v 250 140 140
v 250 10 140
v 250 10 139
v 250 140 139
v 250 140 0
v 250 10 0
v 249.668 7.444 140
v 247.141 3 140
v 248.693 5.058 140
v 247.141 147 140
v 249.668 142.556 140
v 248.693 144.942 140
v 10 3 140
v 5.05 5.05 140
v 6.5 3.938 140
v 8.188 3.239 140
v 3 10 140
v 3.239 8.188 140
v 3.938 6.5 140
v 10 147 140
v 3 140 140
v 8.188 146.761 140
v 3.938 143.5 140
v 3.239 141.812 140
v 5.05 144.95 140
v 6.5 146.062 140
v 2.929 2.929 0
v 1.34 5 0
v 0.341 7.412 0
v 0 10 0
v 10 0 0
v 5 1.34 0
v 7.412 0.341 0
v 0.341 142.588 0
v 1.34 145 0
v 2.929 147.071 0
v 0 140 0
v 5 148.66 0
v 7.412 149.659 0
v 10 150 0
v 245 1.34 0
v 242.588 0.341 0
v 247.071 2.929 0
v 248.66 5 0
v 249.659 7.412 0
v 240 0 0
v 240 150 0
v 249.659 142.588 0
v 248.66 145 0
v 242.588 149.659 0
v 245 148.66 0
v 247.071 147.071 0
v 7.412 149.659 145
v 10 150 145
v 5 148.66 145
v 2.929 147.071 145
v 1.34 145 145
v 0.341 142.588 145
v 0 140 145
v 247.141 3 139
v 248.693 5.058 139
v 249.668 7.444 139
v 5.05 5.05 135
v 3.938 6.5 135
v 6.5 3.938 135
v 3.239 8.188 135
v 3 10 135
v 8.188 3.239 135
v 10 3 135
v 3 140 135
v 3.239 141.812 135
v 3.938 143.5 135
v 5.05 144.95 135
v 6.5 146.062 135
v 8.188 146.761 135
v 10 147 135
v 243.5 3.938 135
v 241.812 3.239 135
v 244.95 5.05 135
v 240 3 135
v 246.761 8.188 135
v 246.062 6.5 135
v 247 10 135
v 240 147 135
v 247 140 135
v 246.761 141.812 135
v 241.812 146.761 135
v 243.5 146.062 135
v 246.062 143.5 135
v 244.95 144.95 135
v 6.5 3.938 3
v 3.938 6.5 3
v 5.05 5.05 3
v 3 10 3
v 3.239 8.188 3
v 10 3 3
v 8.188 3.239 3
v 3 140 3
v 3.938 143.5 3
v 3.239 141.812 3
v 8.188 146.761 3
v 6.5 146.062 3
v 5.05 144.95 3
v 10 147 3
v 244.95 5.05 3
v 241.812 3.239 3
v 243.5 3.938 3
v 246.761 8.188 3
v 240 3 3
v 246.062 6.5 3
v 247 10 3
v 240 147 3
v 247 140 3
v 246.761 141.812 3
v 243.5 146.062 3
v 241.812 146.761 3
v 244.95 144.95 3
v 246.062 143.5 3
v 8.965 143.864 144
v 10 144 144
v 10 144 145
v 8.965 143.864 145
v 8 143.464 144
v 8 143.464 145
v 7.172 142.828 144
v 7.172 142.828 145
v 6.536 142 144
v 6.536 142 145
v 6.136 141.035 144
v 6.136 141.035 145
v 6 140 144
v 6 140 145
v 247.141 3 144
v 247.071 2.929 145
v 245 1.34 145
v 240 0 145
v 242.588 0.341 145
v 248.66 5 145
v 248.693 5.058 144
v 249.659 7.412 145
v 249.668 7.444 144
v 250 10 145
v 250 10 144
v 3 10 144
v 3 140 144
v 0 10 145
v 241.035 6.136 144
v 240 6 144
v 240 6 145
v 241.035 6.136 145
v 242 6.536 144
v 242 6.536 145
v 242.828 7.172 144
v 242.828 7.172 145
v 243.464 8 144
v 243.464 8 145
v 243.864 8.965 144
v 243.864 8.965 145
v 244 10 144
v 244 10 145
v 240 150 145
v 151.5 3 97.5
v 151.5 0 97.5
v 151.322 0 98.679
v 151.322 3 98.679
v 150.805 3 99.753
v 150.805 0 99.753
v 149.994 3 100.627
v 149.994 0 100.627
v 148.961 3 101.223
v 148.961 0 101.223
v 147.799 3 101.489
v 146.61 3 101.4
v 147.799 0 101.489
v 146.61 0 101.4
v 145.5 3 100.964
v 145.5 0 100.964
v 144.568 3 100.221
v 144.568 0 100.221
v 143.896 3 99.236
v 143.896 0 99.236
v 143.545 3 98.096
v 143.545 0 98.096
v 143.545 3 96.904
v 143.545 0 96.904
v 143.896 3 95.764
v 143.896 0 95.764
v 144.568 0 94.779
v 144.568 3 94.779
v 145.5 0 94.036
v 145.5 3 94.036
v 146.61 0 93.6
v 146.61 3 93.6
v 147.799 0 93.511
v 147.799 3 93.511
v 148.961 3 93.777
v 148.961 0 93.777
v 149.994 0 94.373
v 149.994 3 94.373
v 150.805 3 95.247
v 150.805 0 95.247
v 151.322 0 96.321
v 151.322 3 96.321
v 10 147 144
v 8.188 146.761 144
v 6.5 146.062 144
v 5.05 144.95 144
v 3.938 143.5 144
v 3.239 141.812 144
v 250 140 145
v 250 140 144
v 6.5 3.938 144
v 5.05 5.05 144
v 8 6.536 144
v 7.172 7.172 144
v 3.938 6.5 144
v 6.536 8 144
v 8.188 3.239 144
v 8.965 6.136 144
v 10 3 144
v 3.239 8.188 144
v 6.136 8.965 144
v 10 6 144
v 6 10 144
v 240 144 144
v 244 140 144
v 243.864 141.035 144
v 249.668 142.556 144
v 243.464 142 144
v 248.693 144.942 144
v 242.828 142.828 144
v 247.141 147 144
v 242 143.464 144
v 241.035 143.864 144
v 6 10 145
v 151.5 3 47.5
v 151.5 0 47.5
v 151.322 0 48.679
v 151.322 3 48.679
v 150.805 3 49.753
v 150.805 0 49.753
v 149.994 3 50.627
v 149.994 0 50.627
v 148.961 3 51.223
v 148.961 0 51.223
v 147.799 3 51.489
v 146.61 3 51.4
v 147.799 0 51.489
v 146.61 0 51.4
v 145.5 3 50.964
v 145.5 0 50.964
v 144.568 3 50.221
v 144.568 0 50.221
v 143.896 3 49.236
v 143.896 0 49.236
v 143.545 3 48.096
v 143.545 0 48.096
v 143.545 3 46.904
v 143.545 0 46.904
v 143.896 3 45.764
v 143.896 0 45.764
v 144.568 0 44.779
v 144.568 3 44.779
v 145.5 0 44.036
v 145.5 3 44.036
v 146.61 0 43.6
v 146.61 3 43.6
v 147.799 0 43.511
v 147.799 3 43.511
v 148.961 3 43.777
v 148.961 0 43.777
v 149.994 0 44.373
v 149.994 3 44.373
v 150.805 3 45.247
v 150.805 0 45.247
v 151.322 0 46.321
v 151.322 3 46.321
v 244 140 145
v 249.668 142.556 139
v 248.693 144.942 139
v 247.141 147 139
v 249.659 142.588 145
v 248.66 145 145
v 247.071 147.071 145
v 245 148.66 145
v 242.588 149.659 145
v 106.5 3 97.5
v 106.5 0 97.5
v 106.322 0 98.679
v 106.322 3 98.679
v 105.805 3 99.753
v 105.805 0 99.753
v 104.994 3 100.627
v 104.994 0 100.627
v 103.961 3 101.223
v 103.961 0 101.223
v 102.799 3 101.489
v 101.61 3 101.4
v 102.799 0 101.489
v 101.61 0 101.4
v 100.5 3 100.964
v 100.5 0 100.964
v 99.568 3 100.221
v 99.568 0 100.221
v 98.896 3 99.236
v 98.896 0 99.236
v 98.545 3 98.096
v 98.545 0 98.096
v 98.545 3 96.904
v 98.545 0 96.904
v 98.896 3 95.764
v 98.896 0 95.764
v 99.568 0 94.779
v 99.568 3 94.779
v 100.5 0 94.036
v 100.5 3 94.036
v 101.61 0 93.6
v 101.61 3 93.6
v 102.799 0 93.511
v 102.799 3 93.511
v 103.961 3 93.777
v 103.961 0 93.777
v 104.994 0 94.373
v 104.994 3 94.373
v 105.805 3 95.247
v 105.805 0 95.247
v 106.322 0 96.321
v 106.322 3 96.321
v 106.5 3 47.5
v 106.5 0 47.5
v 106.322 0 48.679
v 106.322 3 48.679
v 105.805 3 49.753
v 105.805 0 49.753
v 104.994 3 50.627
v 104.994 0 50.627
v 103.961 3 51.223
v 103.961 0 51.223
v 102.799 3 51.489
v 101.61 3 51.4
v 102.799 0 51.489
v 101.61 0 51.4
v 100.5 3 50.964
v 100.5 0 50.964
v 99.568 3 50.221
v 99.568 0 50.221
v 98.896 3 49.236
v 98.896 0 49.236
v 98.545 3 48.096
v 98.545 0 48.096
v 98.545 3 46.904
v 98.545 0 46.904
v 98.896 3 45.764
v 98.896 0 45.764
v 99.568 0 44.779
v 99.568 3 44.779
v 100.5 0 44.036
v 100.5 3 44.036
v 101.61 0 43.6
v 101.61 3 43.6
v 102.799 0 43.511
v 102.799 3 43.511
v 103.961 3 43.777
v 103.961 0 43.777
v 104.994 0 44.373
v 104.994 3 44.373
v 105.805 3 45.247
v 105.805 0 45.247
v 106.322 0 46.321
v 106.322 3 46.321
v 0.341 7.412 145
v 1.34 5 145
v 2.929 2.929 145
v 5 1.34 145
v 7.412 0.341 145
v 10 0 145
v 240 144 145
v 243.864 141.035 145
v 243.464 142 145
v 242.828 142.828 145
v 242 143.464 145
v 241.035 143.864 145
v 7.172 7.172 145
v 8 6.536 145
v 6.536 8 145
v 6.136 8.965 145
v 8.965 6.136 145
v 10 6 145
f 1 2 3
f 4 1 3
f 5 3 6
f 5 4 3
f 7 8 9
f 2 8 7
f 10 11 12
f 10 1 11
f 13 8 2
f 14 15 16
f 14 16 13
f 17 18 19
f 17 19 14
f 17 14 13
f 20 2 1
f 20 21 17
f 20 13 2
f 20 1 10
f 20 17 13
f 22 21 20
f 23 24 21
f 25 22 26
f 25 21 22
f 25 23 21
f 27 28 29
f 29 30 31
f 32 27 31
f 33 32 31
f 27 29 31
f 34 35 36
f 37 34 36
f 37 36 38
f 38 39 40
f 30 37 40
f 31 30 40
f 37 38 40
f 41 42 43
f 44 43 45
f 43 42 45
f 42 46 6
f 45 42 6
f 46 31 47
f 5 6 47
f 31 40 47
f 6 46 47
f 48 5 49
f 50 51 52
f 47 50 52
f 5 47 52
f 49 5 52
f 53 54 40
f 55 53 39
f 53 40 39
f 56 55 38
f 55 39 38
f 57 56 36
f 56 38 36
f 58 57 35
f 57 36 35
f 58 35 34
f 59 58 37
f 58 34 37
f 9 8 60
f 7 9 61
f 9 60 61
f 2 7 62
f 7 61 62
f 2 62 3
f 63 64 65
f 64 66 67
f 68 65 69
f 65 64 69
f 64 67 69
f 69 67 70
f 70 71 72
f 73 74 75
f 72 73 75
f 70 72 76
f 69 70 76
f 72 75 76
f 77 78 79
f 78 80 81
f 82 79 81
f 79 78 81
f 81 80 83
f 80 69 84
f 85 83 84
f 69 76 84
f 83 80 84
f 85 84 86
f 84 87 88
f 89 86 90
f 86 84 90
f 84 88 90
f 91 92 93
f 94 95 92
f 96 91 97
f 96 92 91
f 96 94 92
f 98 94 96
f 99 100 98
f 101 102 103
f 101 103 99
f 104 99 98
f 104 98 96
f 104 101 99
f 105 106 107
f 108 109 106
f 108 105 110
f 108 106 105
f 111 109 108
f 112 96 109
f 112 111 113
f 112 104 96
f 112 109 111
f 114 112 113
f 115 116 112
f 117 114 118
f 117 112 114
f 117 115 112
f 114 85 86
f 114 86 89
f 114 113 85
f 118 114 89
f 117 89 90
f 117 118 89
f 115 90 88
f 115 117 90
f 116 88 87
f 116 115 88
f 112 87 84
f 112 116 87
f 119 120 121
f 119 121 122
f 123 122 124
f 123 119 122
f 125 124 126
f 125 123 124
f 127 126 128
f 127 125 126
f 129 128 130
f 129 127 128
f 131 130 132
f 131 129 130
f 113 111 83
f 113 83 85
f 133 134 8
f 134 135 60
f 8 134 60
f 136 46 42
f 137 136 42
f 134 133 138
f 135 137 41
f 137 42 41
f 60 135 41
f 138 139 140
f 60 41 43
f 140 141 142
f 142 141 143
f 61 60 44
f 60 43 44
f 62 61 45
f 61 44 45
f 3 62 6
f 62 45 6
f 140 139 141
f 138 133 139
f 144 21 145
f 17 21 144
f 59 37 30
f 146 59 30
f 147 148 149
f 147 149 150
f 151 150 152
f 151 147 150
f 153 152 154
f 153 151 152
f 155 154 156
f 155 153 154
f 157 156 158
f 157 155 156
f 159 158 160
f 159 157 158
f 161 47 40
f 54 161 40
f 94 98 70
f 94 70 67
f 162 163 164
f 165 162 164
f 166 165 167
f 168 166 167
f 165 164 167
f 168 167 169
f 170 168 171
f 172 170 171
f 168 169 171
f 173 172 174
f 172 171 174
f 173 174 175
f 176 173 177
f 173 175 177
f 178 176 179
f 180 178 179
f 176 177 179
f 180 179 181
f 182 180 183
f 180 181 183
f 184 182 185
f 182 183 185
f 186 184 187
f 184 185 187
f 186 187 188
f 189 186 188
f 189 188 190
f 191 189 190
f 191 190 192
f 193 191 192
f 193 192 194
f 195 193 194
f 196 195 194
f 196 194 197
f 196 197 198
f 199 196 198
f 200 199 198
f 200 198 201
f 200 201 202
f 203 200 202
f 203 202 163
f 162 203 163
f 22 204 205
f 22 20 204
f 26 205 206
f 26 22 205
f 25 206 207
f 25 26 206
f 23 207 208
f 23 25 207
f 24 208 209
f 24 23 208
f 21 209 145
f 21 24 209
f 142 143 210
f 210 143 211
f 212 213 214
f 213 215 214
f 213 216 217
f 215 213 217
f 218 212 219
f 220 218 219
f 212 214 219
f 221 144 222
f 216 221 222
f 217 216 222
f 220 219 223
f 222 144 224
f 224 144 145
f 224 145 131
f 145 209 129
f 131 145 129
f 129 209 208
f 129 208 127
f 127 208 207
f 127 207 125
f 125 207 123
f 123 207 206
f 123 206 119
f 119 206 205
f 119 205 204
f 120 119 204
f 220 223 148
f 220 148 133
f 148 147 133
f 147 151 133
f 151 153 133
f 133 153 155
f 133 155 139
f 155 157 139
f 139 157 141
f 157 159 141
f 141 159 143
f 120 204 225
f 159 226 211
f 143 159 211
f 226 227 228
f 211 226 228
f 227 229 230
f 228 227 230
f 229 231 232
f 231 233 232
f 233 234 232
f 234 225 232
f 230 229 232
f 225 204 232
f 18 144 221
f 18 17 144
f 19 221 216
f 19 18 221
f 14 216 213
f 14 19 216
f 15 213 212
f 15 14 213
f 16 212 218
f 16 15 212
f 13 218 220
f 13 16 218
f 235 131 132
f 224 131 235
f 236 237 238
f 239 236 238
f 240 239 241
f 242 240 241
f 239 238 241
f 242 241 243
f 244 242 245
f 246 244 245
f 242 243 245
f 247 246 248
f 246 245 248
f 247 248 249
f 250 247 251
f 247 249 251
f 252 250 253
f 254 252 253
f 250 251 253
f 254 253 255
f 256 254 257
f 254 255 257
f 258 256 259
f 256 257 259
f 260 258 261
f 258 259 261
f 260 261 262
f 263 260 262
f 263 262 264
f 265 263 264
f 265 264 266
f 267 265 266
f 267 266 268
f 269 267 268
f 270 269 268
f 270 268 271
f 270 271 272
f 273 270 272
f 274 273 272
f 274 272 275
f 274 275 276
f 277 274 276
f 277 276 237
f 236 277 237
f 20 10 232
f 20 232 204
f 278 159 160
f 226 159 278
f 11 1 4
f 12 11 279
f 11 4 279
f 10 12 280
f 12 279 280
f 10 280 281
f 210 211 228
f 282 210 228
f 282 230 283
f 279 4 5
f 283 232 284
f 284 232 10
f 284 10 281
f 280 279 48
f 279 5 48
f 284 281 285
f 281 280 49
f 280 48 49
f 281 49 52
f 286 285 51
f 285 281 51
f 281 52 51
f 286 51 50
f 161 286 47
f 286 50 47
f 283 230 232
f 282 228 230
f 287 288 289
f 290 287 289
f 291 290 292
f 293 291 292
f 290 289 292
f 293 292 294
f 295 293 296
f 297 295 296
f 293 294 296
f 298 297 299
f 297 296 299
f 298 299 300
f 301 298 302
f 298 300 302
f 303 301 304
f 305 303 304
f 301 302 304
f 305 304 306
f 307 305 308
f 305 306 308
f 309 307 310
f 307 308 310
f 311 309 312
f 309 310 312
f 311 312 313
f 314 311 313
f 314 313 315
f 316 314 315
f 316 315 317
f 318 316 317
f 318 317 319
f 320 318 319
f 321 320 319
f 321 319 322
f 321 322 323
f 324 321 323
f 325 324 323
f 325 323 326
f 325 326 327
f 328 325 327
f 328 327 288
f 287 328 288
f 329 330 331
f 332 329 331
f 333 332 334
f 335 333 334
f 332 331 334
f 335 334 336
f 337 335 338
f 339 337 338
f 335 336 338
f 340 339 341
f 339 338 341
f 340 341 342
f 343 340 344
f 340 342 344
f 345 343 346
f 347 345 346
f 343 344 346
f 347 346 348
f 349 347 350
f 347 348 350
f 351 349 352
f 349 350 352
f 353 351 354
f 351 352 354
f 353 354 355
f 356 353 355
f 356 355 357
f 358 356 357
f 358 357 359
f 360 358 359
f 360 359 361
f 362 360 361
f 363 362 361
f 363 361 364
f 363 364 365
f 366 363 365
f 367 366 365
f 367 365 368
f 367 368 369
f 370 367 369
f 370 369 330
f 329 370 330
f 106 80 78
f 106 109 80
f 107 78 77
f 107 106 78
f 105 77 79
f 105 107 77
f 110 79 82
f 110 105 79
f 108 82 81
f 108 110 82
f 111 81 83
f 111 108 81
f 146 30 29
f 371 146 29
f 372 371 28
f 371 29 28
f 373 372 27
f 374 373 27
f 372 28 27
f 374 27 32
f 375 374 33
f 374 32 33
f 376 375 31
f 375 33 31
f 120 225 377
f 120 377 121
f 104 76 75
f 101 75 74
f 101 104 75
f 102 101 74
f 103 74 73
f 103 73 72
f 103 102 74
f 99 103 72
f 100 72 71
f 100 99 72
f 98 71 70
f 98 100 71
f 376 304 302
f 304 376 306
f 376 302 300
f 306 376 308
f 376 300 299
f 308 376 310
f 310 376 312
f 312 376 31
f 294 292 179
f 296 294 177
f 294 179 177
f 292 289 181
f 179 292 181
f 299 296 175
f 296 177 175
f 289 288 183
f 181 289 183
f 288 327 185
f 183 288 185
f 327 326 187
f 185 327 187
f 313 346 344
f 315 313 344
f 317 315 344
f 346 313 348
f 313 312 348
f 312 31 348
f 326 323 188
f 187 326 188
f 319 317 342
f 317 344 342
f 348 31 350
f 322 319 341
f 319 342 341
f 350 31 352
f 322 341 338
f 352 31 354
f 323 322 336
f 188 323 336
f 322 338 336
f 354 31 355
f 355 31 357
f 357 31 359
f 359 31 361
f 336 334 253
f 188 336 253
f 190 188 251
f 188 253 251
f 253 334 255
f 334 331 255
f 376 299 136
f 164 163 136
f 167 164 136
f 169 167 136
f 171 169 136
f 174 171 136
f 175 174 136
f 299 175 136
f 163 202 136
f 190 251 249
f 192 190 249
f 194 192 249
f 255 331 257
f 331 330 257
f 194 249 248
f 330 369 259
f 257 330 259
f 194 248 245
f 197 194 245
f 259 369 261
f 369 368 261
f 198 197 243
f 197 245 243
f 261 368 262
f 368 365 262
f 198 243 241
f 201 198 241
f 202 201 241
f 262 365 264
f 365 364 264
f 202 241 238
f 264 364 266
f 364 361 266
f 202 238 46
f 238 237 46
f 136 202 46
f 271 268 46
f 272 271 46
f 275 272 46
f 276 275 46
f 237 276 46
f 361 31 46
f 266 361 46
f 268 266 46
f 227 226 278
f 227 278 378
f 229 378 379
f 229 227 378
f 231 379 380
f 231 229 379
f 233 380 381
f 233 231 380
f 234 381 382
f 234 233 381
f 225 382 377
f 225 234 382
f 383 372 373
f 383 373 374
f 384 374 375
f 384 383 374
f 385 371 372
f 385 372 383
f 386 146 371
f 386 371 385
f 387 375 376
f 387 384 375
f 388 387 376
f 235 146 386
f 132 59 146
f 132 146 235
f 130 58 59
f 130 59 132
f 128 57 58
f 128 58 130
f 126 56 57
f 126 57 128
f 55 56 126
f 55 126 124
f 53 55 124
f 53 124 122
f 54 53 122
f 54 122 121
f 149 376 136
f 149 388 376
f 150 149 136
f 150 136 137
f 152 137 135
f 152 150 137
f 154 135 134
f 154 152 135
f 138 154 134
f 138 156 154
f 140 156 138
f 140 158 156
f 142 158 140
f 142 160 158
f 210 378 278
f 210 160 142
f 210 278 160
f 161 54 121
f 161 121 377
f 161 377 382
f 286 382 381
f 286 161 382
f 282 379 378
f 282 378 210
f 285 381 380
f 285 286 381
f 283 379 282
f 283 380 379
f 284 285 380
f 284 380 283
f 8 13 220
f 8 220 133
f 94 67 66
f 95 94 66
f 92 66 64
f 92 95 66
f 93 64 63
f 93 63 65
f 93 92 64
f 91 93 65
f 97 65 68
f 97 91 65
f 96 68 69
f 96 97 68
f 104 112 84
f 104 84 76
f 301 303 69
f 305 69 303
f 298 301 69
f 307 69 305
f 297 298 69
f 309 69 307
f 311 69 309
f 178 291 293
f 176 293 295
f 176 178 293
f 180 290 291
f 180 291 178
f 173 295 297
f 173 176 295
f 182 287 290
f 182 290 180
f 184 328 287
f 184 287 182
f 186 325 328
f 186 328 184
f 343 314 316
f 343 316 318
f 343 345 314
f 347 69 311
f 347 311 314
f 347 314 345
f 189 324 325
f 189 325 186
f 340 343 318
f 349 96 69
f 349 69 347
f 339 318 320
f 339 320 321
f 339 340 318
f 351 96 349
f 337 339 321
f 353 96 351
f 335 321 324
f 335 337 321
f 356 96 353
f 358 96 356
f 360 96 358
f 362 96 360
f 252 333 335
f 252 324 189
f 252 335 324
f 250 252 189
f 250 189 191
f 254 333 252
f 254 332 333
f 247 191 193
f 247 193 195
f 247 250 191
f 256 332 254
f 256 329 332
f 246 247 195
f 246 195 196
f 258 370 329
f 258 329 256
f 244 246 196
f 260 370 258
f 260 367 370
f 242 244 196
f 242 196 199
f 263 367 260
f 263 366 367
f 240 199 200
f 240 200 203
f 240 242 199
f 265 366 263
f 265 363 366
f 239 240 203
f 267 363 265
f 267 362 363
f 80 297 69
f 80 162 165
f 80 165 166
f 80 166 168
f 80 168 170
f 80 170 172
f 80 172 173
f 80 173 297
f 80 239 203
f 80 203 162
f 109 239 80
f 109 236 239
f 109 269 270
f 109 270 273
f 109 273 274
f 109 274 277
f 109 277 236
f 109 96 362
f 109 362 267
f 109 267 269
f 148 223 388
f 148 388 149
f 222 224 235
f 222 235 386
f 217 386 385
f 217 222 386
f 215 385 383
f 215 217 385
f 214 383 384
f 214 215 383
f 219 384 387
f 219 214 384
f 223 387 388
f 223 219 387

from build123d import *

# Parameters (mm, degrees)
BOSS_EXTRUDE1_DEPTH = 150
SHELL2_T            = -3
BOSS_EXTRUDE2_DEPTH = 3
CUT_EXTRUDE1_DEPTH  = 5
BOSS_EXTRUDE3_DEPTH = 5
BOSS_EXTRUDE4_DEPTH = 1
SKETCH10_W          = 5
SKETCH10_H          = 144
CUT_EXTRUDE2_DEPTH  = 8
SKETCH11_W          = 5
SKETCH11_H          = 144
CUT_EXTRUDE3_DEPTH  = 8
SKETCH12_W          = 1
SKETCH12_H          = 144
BOSS_EXTRUDE5_DEPTH = 16
CUT_EXTRUDE4_DEPTH  = 8
CUT_EXTRUDE5_DEPTH  = 8
SKETCH15_R          = 4
CUT_EXTRUDE13_DEPTH = 9


with BuildPart() as part:
    # Sketch2 → Boss-Extrude1 (new body)
    with BuildSketch(Plane.XY):
        with BuildLine():
            Line((10, 0), (240, 0))
            ThreePointArc((240, 0), (247.071067812, 2.928932188), (250, 10))
            Line((250, 10), (250, 140))
            ThreePointArc((250, 140), (247.071067812, 147.071067812), (240, 150))
            Line((240, 150), (10, 150))
            ThreePointArc((10, 150), (2.928932188, 147.071067812), (0, 140))
            Line((0, 140), (0, 10))
            ThreePointArc((0, 10), (2.928932188, 2.928932188), (10, 0))
        make_face()
    extrude(amount=BOSS_EXTRUDE1_DEPTH)

    # Shell2
    shell2_openings = [part.faces().sort_by_distance(p)[0] for p in [
        (125, 75, 0),
    ]]
    offset(amount=SHELL2_T, openings=shell2_openings, kind=Kind.INTERSECTION)

    # Sketch4 → Boss-Extrude2 (add)
    with BuildSketch(Plane(origin=(0, 0, 0), x_dir=(-1, 0, 0), z_dir=(0, 0, -1))):
        with BuildLine():
            Line((-10, 3), (-240, 3))
            ThreePointArc((-240, 3), (-244.949747468, 5.050252532), (-247, 10))
            Line((-247, 10), (-247, 140))
            ThreePointArc((-247, 140), (-244.949747468, 144.949747468), (-240, 147))
            Line((-240, 147), (-10, 147))
            ThreePointArc((-10, 147), (-5.050252532, 144.949747468), (-3, 140))
            Line((-3, 140), (-3, 10))
            ThreePointArc((-3, 10), (-5.050252532, 5.050252532), (-10, 3))
        make_face()
    extrude(amount=-BOSS_EXTRUDE2_DEPTH)

    # Sketch5 → Cut-Extrude1 (cut)
    with BuildSketch(Plane.XY.offset(150)):
        with BuildLine():
            Line((240, 150), (10, 150))
            ThreePointArc((10, 150), (2.928932188, 147.071067812), (0, 140))
            Line((0, 140), (0, 10))
            ThreePointArc((0, 10), (2.928932188, 2.928932188), (10, 0))
            Line((10, 0), (240, 0))
            ThreePointArc((240, 0), (247.071067812, 2.928932188), (250, 10))
            Line((250, 10), (250, 140))
            ThreePointArc((250, 140), (247.071067812, 147.071067812), (240, 150))
        make_face()
    extrude(amount=-CUT_EXTRUDE1_DEPTH, mode=Mode.SUBTRACT)

    # Sketch6 → Boss-Extrude3 (add)
    with BuildSketch(Plane.XY.offset(135)):
        with BuildLine():
            Line((10, 3), (240, 3))
            ThreePointArc((240, 3), (244.949747468, 5.050252532), (247, 10))
            Line((247, 10), (247, 140))
            ThreePointArc((247, 140), (244.949747468, 144.949747468), (240, 147))
            Line((240, 147), (10, 147))
            ThreePointArc((10, 147), (5.050252532, 144.949747468), (3, 140))
            Line((3, 140), (3, 10))
            ThreePointArc((3, 10), (5.050252532, 5.050252532), (10, 3))
        make_face()
    extrude(amount=BOSS_EXTRUDE3_DEPTH)

    # Sketch7 → Boss-Extrude4 (add)
    with BuildSketch(Plane.XY.offset(144)):
        with BuildLine():
            Line((10, 3), (240, 3))
            ThreePointArc((240, 3), (244.949747468, 5.050252532), (247, 10))
            Line((247, 10), (247, 140))
            ThreePointArc((247, 140), (244.949747468, 144.949747468), (240, 147))
            Line((240, 147), (10, 147))
            ThreePointArc((10, 147), (5.050252532, 144.949747468), (3, 140))
            Line((3, 140), (3, 10))
            ThreePointArc((3, 10), (5.050252532, 5.050252532), (10, 3))
        make_face()
        with BuildLine():
            Line((6, 140), (6, 10))
            ThreePointArc((6, 10), (7.171572875, 7.171572875), (10, 6))
            Line((10, 6), (240, 6))
            ThreePointArc((240, 6), (242.828427125, 7.171572875), (244, 10))
            Line((244, 10), (244, 140))
            ThreePointArc((244, 140), (242.828427125, 142.828427125), (240, 144))
            Line((240, 144), (10, 144))
            ThreePointArc((10, 144), (7.171572875, 142.828427125), (6, 140))
        make_face(mode=Mode.SUBTRACT)
    extrude(amount=BOSS_EXTRUDE4_DEPTH)

    # Sketch10 → Cut-Extrude2 (cut)
    with BuildSketch(Plane(origin=(250, 0, 0), x_dir=(0, 0, -1), z_dir=(1, 0, 0))):
        with Locations((-141.5, 75)):
            Rectangle(SKETCH10_W, SKETCH10_H)
    extrude(amount=-CUT_EXTRUDE2_DEPTH, mode=Mode.SUBTRACT)

    # Sketch11 → Cut-Extrude3 (cut)
    with BuildSketch(Plane(origin=(242, 0, 0), x_dir=(0, 0, -1), z_dir=(1, 0, 0))):
        with Locations((-141.5, 75)):
            Rectangle(SKETCH11_W, SKETCH11_H)
    extrude(amount=-CUT_EXTRUDE3_DEPTH, mode=Mode.SUBTRACT)

    # Sketch12 → Boss-Extrude5 (add)
    with BuildSketch(Plane(origin=(234, 0, 0), x_dir=(0, 0, -1), z_dir=(1, 0, 0))):
        with Locations((-139.5, 75)):
            Rectangle(SKETCH12_W, SKETCH12_H)
    extrude(amount=BOSS_EXTRUDE5_DEPTH)

    # Sketch13 → Cut-Extrude4 (cut)
    with BuildSketch(Plane(origin=(0, 0, 139), x_dir=(-1, 0, 0), z_dir=(0, 0, -1))):
        with BuildLine():
            Line((-250, 3), (-247.141428429, 3))
            ThreePointArc((-247.141428429, 3), (-249.257815193, 6.219410382), (-250, 10))
            Line((-250, 10), (-250, 3))
        make_face()
    extrude(amount=-CUT_EXTRUDE4_DEPTH, mode=Mode.SUBTRACT)

    # Sketch14 → Cut-Extrude5 (cut)
    with BuildSketch(Plane(origin=(0, 0, 139), x_dir=(-1, 0, 0), z_dir=(0, 0, -1))):
        with BuildLine():
            Line((-250, 147), (-250, 140))
            ThreePointArc((-250, 140), (-249.257815193, 143.780589618), (-247.141428429, 147))
            Line((-247.141428429, 147), (-250, 147))
        make_face()
    extrude(amount=-CUT_EXTRUDE5_DEPTH, mode=Mode.SUBTRACT)

    # Sketch15 → Cut-Extrude13 (cut)
    with BuildSketch(Plane.XZ):
        with Locations((102.5, 97.5)):
            Circle(SKETCH15_R)
        with Locations((102.5, 47.5)):
            Circle(SKETCH15_R)
        with Locations((147.5, 47.5)):
            Circle(SKETCH15_R)
        with Locations((147.5, 97.5)):
            Circle(SKETCH15_R)
    extrude(amount=-CUT_EXTRUDE13_DEPTH, mode=Mode.SUBTRACT)


solid = part.part
